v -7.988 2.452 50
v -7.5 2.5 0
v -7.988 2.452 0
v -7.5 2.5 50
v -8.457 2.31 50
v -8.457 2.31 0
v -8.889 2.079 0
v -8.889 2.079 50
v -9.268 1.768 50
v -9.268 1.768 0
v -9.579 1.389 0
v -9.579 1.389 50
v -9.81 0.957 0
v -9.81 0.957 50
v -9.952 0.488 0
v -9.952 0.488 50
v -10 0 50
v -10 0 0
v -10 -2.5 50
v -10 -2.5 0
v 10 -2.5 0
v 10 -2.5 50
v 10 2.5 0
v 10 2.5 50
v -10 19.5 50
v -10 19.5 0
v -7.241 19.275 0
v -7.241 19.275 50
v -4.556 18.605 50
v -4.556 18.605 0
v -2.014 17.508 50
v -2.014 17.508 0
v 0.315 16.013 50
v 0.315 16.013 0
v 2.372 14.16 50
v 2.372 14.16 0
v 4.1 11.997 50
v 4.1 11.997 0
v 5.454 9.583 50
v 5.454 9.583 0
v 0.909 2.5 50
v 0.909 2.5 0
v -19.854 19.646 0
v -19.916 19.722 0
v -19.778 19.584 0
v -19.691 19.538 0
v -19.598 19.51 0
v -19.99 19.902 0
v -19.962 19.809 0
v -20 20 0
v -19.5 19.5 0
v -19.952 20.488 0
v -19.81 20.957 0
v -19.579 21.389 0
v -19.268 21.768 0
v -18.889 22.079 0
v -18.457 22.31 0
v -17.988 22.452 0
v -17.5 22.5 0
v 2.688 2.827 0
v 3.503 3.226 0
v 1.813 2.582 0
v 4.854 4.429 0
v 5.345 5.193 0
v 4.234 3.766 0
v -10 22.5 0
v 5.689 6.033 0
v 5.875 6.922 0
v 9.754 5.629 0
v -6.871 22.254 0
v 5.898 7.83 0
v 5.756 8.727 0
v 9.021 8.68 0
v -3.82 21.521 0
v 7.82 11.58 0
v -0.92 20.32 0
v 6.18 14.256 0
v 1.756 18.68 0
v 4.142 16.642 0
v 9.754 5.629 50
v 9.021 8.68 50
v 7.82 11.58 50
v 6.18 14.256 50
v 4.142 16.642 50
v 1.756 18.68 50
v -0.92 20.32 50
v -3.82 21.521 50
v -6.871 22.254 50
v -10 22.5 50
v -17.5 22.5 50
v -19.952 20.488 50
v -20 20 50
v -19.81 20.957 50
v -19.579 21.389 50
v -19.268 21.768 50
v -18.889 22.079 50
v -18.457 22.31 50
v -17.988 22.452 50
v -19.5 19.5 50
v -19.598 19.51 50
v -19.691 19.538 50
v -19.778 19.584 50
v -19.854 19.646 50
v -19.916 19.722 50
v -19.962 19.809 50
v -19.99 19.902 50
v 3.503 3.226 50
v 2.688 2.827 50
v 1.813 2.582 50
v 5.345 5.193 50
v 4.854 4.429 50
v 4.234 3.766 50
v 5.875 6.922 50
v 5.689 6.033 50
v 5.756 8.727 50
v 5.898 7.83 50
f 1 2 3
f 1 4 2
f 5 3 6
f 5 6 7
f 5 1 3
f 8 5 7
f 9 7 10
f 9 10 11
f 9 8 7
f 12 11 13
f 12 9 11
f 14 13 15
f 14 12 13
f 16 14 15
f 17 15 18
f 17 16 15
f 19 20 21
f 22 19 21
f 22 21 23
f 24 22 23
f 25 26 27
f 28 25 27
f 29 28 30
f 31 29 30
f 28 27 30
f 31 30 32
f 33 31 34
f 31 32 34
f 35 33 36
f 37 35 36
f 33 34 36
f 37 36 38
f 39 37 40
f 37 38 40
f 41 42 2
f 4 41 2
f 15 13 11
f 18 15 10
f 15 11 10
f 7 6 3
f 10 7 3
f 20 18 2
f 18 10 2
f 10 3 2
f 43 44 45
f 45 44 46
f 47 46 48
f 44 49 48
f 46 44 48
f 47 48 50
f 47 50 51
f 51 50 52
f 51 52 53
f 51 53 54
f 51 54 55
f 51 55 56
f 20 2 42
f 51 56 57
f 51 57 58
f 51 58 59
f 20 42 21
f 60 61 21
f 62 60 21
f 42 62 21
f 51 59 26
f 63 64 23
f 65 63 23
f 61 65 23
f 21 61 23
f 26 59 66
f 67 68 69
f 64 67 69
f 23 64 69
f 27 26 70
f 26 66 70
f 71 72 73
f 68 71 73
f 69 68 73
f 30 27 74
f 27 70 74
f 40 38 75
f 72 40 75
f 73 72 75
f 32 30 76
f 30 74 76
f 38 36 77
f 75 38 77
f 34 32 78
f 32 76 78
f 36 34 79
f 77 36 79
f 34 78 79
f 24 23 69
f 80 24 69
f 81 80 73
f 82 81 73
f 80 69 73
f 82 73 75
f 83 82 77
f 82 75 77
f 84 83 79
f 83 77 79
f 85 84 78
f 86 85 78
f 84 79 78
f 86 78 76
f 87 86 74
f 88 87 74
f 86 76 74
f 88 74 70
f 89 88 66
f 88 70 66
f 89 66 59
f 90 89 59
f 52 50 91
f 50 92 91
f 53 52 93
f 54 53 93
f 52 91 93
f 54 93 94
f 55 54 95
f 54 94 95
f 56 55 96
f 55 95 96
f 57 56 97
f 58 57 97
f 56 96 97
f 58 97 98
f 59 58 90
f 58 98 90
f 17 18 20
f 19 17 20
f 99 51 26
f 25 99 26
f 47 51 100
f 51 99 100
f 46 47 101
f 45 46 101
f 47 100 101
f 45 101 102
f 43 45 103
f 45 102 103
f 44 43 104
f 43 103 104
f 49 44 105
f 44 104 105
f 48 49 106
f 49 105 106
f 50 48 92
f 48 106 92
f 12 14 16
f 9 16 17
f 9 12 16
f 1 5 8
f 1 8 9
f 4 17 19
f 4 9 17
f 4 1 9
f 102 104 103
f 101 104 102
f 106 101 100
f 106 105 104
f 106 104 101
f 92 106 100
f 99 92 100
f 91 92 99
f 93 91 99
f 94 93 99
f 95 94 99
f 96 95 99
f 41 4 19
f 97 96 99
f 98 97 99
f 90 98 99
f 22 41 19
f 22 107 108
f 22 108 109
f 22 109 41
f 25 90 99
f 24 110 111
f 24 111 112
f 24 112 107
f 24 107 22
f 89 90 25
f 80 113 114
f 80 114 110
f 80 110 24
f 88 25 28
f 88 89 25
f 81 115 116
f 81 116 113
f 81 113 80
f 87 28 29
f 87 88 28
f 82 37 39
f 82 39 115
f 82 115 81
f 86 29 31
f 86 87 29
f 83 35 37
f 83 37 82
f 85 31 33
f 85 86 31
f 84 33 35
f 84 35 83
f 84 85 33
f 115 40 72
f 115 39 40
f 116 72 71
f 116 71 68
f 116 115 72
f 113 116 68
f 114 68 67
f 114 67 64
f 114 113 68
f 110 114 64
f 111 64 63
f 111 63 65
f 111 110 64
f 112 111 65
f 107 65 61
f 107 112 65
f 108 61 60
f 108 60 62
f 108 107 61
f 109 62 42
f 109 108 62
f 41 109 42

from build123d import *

# Parameters (mm, degrees)
F1_DEPTH = 50
F2_R     = 5
F3_R     = 2.5
F4_R     = 0.49999


# Not quite as in the source:
# - a fillet or chamfer is up to 0.001 mm smaller than in the source, because OpenCascade refuses the exact size


with BuildPart() as f1:
    # F0 (on Top) → F1 (new body)
    with BuildSketch(Plane.XY):
        with BuildLine():
            Line((7, 2.5), (10, 2.5))
            ThreePointArc((10, 2.5), (4.1421356237, 16.6421356237), (-10, 22.5))
            Line((-10, 22.5), (-20, 22.5))
            Line((-20, 22.5), (-20, 19.5))
            Line((-20, 19.5), (-10, 19.5))
            ThreePointArc((-10, 19.5), (2.0208152802, 14.5208152802), (7, 2.5))
        make_face()
        Polygon((-10, -2.5), (10, -2.5), (10, 2.5), (7, 2.5), (-10, 2.5), align=None)
    extrude(amount=F1_DEPTH)

    # F2
    f2_edges = [f1.edges().sort_by_distance(p)[0] for p in [
        (7, 2.5, 25),
    ]]
    fillet(f2_edges, radius=F2_R)

    # F3
    f3_edges = [f1.edges().sort_by_distance(p)[0] for p in [
        (-20, 22.5, 25),
        (-10, 2.5, 25),
    ]]
    fillet(f3_edges, radius=F3_R)

    # F4 (radius 0.5 in the source; OpenCascade refuses exactly that, so slightly less here)
    f4_edges = [f1.edges().sort_by_distance(p)[0] for p in [
        (-20, 19.5, 25),
    ]]
    fillet(f4_edges, radius=F4_R)


solid = f1.part
